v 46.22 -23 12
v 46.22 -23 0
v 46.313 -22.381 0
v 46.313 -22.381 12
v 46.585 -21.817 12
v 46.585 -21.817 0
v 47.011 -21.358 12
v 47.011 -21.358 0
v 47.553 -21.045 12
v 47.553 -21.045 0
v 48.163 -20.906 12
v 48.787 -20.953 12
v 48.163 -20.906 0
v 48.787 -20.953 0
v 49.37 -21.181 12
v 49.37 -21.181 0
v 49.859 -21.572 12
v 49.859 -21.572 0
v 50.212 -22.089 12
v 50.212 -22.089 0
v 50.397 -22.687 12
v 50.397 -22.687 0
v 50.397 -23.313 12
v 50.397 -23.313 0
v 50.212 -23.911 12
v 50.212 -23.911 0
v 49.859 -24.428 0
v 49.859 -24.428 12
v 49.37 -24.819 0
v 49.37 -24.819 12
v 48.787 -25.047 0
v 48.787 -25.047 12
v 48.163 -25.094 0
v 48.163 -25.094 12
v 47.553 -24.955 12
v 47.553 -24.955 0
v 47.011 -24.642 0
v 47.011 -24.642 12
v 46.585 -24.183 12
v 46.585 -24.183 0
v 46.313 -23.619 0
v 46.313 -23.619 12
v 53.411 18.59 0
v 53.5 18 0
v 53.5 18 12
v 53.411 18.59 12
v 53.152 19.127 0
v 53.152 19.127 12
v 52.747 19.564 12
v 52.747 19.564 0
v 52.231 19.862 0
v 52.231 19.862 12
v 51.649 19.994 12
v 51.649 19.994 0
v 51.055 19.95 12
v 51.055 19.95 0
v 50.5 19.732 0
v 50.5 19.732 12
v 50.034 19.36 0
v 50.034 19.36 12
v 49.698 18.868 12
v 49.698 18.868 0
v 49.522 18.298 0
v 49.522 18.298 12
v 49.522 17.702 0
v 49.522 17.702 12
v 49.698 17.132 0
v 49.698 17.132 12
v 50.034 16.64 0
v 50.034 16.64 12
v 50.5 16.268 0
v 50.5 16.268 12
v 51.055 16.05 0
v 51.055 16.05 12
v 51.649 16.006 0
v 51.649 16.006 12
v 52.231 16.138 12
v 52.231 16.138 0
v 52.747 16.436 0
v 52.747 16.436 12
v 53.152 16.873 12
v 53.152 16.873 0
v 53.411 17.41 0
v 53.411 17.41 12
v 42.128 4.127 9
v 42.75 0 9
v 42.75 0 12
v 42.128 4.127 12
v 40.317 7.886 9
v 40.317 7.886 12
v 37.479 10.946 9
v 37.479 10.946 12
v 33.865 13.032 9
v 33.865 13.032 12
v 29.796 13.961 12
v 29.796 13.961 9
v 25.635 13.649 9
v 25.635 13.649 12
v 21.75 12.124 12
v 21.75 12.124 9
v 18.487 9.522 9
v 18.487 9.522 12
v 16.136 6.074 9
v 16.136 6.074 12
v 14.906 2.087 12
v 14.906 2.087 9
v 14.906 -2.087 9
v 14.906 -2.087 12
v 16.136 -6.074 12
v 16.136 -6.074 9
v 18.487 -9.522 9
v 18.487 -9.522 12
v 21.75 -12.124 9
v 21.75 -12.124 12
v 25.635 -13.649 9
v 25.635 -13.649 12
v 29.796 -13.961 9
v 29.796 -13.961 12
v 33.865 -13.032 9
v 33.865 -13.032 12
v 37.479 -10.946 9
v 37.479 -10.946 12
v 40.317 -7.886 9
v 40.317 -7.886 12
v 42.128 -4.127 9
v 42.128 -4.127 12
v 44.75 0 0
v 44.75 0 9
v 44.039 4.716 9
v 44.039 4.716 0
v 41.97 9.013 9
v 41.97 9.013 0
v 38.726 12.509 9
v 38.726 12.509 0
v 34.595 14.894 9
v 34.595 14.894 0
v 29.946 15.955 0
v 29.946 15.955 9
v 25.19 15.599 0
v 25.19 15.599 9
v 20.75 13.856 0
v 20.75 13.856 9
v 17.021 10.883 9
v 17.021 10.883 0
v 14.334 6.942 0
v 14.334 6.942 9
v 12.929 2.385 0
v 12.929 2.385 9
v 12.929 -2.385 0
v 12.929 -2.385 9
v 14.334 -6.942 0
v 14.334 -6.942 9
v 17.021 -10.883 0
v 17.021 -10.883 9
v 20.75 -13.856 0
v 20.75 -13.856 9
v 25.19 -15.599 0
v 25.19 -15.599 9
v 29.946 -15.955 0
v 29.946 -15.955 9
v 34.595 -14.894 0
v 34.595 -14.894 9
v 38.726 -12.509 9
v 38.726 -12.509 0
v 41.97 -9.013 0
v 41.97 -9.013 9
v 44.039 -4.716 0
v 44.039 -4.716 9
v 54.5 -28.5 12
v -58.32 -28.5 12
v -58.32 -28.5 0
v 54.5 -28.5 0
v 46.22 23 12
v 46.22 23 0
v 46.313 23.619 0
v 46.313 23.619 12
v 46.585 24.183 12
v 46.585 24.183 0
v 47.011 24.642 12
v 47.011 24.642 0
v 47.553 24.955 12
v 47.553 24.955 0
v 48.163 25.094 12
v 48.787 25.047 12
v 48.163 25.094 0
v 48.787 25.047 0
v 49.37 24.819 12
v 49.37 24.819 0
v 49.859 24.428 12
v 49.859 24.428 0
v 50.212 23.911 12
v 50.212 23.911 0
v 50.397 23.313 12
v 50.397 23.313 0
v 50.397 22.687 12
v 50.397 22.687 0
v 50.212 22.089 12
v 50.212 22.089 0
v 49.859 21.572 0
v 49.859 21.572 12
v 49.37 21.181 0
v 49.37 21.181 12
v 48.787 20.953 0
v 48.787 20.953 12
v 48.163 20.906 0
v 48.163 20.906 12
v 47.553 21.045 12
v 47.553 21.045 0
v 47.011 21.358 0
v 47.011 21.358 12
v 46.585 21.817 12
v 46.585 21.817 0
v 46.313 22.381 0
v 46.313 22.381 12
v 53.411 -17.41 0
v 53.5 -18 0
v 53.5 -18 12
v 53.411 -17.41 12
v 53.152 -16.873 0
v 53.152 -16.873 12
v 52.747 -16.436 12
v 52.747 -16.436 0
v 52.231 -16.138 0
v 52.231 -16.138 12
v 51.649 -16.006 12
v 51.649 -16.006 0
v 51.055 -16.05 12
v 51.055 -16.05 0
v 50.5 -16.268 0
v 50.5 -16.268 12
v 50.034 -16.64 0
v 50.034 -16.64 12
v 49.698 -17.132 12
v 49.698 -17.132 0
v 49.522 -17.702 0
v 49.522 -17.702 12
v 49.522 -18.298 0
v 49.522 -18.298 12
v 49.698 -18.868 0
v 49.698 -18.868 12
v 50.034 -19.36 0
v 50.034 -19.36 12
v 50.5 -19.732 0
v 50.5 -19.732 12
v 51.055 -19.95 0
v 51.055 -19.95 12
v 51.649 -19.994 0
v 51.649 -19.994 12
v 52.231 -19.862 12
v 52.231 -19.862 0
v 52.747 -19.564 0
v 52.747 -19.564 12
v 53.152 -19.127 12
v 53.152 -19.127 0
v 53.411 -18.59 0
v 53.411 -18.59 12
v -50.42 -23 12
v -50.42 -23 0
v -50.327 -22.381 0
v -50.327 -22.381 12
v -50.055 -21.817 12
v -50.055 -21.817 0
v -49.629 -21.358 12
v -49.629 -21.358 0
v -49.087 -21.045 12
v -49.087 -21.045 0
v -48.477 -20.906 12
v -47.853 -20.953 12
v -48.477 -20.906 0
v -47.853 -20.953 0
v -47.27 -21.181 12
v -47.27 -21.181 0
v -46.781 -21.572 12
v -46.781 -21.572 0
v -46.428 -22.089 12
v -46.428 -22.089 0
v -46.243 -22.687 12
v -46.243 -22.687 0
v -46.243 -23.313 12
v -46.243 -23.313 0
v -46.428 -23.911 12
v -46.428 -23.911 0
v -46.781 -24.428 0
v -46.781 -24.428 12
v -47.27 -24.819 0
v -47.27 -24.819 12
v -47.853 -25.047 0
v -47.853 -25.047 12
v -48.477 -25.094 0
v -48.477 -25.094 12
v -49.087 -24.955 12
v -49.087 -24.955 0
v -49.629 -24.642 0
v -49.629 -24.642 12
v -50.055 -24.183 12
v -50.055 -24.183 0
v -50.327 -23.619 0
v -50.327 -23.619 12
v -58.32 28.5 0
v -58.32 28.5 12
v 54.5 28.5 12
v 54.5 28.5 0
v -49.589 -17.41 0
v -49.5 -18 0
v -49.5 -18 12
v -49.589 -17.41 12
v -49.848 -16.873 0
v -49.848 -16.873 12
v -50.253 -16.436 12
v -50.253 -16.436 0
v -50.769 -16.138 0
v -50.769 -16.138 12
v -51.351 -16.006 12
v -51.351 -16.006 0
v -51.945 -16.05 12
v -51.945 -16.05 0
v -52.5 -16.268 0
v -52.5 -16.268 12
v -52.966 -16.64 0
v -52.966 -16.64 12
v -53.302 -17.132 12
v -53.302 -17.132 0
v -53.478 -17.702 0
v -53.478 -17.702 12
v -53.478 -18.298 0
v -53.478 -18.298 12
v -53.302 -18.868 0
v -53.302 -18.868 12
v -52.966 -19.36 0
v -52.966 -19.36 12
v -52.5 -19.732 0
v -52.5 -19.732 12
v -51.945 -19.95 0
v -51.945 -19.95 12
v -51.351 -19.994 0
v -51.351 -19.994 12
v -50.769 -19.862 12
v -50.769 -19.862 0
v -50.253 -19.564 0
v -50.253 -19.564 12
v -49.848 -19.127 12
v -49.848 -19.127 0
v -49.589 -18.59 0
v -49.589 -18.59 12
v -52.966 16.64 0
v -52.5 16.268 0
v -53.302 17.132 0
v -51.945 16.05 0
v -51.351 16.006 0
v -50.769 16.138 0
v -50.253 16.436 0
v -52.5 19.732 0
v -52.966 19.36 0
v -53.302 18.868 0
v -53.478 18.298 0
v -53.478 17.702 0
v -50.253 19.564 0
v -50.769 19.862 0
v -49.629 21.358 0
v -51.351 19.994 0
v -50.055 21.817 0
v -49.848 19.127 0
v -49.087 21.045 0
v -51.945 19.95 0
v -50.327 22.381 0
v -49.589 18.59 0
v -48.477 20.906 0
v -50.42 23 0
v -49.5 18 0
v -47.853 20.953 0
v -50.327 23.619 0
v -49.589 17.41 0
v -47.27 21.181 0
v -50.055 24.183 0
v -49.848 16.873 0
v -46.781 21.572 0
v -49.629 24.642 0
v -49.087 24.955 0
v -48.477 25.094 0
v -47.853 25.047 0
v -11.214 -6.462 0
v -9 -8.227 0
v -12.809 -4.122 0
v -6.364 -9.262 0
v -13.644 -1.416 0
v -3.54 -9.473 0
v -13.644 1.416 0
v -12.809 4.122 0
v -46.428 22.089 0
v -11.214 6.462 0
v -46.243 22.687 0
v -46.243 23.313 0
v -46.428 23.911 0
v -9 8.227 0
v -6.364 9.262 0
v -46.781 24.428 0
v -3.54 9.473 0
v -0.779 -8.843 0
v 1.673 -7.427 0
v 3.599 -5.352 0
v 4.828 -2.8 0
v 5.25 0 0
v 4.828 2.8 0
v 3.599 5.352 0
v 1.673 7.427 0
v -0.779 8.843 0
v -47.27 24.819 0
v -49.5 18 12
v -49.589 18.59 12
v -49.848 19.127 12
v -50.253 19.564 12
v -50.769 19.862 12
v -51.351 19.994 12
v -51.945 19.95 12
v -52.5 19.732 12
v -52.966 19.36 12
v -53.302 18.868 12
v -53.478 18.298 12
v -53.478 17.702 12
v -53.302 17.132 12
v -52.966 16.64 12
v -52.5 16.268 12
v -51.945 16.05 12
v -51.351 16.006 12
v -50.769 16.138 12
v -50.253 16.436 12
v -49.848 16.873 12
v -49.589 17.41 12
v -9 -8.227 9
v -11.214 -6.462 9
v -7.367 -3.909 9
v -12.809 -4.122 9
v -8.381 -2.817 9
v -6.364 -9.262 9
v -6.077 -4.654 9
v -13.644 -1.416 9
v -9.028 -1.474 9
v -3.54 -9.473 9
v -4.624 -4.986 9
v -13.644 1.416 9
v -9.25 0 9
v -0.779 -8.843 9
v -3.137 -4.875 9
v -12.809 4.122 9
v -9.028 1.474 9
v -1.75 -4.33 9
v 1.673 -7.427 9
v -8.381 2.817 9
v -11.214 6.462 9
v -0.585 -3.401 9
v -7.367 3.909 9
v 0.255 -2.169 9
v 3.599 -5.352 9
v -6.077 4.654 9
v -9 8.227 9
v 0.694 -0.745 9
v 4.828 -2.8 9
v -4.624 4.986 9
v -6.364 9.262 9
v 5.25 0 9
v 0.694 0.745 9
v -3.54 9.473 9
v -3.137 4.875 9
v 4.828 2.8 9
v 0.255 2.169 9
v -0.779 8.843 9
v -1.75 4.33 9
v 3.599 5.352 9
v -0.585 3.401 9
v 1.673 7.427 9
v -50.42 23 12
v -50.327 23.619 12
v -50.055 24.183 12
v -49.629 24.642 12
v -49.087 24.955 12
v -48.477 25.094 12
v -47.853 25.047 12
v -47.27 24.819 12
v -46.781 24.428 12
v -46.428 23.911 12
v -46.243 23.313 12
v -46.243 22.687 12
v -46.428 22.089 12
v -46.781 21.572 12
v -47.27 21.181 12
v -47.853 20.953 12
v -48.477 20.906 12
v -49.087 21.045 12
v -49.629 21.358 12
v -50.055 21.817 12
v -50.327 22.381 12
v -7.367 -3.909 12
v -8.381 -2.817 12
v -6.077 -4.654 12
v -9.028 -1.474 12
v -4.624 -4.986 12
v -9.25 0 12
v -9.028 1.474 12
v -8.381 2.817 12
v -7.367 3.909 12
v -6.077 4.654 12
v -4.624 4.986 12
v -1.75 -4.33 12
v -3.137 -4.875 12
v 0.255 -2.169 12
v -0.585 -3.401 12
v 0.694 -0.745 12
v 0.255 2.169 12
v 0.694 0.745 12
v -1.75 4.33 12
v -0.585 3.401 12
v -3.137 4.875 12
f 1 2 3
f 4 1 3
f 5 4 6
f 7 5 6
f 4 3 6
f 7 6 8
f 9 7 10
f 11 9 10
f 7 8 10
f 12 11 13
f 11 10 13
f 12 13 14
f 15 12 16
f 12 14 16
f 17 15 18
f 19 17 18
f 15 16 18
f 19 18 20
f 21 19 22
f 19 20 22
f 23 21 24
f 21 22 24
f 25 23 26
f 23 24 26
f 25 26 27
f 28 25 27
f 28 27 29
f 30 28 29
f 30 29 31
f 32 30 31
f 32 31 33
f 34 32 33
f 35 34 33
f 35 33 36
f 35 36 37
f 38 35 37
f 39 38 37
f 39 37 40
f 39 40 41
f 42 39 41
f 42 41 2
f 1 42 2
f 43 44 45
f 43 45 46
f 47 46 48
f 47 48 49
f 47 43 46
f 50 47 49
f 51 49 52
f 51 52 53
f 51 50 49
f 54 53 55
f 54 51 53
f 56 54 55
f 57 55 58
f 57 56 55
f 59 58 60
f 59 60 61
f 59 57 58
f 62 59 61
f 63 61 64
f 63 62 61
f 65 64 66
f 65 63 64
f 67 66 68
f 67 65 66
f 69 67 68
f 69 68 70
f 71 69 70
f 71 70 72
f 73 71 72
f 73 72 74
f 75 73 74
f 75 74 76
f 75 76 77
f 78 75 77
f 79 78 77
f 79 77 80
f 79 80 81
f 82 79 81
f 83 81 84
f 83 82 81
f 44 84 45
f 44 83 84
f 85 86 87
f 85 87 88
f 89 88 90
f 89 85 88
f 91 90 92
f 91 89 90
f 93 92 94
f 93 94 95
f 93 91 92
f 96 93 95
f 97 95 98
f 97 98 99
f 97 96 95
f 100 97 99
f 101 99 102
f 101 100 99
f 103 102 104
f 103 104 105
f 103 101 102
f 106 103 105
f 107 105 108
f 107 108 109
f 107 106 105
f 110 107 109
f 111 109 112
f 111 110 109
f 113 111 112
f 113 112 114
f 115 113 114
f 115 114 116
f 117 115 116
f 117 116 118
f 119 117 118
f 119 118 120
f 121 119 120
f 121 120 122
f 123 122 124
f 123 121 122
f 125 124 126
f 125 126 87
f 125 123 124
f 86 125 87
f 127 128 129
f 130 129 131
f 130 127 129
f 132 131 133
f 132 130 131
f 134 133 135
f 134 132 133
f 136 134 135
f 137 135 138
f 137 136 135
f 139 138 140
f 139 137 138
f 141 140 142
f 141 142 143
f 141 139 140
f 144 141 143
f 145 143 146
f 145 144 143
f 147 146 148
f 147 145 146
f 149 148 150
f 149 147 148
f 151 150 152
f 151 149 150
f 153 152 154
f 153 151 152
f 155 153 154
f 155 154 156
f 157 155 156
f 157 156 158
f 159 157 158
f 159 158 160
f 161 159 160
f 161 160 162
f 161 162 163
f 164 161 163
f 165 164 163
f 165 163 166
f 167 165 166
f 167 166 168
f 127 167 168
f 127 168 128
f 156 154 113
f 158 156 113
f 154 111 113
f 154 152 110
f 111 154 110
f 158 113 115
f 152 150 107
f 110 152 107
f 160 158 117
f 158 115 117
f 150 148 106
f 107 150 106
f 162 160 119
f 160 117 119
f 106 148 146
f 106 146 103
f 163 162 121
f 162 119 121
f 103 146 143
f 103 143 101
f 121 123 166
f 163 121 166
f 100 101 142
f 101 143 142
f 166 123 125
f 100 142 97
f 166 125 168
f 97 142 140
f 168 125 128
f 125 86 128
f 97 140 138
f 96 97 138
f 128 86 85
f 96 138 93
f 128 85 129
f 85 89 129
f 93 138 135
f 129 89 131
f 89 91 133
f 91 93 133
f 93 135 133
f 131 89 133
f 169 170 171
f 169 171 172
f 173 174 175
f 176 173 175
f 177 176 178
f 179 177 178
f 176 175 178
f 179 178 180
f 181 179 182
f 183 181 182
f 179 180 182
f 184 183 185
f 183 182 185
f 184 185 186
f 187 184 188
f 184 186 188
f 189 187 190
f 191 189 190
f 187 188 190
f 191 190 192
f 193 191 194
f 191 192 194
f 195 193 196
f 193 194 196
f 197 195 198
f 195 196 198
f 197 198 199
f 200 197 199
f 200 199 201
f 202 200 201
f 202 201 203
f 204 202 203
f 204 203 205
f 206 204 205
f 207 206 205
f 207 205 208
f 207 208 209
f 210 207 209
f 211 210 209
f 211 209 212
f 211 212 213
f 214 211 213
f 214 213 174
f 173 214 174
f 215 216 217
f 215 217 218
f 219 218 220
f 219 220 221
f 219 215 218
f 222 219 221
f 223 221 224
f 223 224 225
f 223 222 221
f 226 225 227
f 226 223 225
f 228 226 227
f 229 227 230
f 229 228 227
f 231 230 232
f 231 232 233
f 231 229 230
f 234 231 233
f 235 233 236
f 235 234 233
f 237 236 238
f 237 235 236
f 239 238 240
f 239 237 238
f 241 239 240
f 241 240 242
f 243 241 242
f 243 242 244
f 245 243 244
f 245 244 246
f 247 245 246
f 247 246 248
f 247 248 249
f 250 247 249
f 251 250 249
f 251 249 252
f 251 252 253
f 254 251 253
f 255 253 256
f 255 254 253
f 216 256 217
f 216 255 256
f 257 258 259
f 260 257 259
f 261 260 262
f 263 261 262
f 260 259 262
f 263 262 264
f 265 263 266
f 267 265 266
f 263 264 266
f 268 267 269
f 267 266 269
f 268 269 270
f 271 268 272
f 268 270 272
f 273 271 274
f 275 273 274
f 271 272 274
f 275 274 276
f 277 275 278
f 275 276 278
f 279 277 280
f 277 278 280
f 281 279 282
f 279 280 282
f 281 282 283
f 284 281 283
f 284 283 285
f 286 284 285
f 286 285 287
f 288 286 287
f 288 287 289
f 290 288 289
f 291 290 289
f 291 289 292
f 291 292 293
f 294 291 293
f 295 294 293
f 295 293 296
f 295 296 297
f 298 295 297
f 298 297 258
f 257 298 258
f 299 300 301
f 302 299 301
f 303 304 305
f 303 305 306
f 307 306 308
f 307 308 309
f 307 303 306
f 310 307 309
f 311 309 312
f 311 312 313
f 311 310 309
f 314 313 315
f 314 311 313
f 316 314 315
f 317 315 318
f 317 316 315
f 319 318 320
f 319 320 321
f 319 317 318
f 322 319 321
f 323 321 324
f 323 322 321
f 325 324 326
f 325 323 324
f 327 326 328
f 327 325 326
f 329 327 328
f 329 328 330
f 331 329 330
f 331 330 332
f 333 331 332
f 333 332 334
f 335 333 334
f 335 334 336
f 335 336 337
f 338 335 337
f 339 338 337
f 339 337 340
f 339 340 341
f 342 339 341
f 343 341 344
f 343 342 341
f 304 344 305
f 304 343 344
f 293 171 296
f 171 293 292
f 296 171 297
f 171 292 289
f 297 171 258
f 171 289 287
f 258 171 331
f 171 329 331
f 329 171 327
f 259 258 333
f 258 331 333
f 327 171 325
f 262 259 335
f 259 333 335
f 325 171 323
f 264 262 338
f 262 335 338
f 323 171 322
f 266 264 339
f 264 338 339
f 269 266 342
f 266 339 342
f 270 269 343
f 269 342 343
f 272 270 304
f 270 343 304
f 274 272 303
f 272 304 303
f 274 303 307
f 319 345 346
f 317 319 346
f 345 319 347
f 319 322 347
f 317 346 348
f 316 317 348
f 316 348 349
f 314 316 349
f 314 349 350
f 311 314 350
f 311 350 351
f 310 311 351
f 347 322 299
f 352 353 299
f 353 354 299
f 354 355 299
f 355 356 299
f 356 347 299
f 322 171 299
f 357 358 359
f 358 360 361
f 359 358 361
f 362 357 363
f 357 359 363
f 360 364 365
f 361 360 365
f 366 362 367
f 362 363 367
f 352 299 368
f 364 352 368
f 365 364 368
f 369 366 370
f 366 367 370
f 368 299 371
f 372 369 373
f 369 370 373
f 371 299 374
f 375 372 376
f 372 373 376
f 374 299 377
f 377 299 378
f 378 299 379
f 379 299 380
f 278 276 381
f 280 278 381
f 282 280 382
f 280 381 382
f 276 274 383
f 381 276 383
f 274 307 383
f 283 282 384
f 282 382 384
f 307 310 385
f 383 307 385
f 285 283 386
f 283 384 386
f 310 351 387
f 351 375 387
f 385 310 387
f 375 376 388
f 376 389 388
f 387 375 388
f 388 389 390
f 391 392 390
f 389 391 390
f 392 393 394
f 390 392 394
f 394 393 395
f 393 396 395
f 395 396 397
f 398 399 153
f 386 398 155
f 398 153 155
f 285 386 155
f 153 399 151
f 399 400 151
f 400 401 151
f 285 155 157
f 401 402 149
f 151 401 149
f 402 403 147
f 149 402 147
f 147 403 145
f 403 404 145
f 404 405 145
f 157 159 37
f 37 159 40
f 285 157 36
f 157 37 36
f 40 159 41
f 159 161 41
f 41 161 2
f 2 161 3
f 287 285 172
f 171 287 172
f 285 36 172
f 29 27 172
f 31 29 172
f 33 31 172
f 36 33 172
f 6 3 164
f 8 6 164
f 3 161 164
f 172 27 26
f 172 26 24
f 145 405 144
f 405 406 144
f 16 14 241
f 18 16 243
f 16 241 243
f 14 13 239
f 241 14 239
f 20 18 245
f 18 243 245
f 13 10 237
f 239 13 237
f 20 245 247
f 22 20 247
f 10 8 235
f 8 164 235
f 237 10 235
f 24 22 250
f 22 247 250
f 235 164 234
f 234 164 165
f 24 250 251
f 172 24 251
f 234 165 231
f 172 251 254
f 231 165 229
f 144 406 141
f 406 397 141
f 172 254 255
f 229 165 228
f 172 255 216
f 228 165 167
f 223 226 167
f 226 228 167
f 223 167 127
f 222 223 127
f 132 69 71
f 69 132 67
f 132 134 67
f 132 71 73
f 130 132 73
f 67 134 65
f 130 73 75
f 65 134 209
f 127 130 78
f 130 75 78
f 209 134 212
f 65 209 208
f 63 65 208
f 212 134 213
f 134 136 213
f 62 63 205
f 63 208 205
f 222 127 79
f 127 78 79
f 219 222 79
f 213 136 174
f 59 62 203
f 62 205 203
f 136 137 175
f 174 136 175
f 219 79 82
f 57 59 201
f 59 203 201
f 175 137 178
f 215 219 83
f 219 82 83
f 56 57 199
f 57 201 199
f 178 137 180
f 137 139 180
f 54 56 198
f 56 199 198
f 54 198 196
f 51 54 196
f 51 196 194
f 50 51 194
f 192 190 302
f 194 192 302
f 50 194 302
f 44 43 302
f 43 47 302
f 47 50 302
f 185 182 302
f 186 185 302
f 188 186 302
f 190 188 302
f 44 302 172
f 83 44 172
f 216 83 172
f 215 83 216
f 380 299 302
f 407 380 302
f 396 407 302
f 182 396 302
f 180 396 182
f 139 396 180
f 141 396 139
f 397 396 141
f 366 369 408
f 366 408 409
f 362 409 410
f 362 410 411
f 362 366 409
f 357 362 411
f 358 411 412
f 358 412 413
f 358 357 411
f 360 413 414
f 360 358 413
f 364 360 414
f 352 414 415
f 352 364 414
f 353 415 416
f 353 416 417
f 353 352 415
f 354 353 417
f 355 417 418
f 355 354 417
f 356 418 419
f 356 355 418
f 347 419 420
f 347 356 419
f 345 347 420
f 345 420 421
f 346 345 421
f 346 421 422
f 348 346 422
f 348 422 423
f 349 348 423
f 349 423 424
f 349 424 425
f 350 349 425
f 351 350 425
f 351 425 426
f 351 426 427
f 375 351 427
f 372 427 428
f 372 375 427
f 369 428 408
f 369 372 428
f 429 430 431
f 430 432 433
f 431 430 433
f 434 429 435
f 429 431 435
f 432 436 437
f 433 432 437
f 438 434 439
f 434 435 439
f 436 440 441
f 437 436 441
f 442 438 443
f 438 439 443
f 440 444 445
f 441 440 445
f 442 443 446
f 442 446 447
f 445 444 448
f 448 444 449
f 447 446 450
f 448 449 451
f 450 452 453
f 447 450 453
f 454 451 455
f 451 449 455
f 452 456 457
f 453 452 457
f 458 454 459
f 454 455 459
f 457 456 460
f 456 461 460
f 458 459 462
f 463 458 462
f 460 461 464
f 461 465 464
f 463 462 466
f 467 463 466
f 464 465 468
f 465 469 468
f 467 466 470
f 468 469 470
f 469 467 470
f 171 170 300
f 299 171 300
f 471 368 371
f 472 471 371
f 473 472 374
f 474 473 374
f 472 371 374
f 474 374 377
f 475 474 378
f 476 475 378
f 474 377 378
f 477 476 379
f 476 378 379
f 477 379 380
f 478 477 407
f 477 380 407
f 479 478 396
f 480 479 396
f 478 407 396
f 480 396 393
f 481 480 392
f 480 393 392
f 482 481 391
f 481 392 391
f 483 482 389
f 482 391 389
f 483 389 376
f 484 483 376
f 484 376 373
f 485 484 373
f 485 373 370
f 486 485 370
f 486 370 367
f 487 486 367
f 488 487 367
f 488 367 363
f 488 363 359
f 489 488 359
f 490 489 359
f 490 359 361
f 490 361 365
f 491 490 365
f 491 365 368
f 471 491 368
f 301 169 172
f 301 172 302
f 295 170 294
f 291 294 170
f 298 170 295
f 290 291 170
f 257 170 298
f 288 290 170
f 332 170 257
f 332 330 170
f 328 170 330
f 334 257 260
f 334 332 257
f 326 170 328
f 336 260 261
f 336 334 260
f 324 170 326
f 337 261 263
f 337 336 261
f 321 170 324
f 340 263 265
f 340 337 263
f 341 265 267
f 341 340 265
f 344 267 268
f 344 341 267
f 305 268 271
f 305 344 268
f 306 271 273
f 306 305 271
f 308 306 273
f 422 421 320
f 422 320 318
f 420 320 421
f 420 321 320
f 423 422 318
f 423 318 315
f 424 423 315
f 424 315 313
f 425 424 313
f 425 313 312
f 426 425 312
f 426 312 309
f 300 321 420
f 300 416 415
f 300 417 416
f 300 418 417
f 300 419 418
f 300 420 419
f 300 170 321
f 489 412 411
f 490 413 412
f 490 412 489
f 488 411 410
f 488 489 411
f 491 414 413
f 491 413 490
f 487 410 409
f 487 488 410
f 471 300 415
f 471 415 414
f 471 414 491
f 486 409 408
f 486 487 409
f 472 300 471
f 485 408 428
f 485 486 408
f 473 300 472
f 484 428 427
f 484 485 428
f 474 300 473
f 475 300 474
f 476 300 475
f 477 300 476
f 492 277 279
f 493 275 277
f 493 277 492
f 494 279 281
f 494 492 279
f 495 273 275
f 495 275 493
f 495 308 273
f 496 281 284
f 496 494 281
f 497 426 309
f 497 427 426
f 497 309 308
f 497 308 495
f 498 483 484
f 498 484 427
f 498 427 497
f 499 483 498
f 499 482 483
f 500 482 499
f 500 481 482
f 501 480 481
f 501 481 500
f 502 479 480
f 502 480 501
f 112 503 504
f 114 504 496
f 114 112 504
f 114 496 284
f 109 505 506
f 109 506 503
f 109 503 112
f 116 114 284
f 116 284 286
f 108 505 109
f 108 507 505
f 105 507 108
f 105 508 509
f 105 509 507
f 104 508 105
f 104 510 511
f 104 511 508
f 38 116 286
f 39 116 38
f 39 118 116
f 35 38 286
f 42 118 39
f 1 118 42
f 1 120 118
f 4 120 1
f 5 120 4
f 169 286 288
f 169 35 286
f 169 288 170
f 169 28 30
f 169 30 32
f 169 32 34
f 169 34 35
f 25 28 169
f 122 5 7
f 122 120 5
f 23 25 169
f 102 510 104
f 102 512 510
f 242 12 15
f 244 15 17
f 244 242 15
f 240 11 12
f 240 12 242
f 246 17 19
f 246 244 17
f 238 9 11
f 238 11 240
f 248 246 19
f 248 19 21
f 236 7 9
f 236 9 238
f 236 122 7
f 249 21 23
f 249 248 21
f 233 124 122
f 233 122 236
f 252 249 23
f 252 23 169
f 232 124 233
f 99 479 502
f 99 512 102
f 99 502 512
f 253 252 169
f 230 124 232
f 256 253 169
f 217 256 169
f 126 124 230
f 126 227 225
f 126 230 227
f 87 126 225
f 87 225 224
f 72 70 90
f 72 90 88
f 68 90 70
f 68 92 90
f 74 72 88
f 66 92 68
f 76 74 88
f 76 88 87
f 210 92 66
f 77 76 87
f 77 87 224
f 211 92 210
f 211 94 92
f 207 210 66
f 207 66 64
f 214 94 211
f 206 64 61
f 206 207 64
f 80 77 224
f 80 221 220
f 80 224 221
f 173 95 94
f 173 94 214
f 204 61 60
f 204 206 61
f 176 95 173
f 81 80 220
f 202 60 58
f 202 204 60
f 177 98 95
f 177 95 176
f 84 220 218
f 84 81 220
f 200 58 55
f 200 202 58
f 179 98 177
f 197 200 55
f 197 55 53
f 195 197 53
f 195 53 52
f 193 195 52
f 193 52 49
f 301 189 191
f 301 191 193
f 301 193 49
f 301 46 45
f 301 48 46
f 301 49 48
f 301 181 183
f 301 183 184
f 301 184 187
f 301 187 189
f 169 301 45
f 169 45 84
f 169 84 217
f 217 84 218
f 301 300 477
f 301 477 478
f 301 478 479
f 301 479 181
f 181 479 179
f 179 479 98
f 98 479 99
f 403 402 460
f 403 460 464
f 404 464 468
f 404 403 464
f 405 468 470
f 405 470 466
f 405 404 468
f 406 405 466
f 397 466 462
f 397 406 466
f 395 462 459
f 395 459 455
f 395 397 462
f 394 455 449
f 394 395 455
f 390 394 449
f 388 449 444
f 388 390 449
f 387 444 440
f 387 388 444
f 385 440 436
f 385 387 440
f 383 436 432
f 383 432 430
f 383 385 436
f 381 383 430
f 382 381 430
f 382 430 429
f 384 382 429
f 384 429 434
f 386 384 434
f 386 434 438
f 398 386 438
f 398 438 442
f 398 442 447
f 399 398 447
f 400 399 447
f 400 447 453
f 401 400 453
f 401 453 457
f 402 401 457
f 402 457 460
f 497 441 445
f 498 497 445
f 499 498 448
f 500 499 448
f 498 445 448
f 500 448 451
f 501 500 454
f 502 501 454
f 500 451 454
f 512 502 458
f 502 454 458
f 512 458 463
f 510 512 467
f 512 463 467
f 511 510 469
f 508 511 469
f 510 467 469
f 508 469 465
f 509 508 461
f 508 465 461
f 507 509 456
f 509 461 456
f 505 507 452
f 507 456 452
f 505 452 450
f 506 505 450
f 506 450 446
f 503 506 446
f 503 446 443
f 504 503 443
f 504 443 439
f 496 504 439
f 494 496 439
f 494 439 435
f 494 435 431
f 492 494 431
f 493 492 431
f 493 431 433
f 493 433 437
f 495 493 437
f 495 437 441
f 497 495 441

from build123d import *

# Parameters (mm, degrees)
ESBO_O1_W                = 118
ESBO_O1_H                = 62
ESBO_O1_R                = 9.5
ESBO_O1_R_2              = 16
ESBO_O1_R_3              = 2
RESSALTO_EXTRUS_O1_DEPTH = 12
FURO_COM_FOLGA_DE_M51_D  = 4.2
RESSALTO_EXTRUS_O4_START = -3
ESBO_O17_R               = 9.5
RESSALTO_EXTRUS_O4_DEPTH = 3
ESBO_O18_W               = 118
ESBO_O18_H               = 62
ESBO_O18_W_2             = 112.82
ESBO_O18_H_2             = 57
CORTE_EXTRUS_O3_DEPTH    = 68.720011813
RESSALTO_EXTRUS_O5_START = -3
ESBO_O19_R               = 16
ESBO_O19_R_2             = 14
RESSALTO_EXTRUS_O5_DEPTH = 3
ESBO_O21_R               = 5
CORTE_EXTRUS_O4_DEPTH    = 10


with BuildPart() as part:
    # Esboço1 → Ressalto-extrusão1 (new body)
    with BuildSketch(Plane.XY):
        Rectangle(ESBO_O1_W, ESBO_O1_H)
        with Locations((-4.25, 0)):
            Circle(ESBO_O1_R, mode=Mode.SUBTRACT)
        with Locations((28.75, 0)):
            Circle(ESBO_O1_R_2, mode=Mode.SUBTRACT)
        with Locations((51.5, -18)):
            Circle(ESBO_O1_R_3, mode=Mode.SUBTRACT)
        with Locations((51.5, 18)):
            Circle(ESBO_O1_R_3, mode=Mode.SUBTRACT)
        with Locations((-51.5, -18)):
            Circle(ESBO_O1_R_3, mode=Mode.SUBTRACT)
        with Locations((-51.5, 18)):
            Circle(ESBO_O1_R_3, mode=Mode.SUBTRACT)
    extrude(amount=RESSALTO_EXTRUS_O1_DEPTH)

    # Furo com folga de M51 (through all)
    with Locations(Plane.XY.offset(12)):
        with Locations((-48.32, 23), (-48.32, -23), (48.32, -23), (48.32, 23)):
            Hole(FURO_COM_FOLGA_DE_M51_D / 2)

    # Esboço17 → Ressalto-extrusão4 (add)
    with BuildSketch(Plane.XY.offset(12).offset(RESSALTO_EXTRUS_O4_START)):
        with Locations((-4.25, 0)):
            Circle(ESBO_O17_R)
    extrude(amount=RESSALTO_EXTRUS_O4_DEPTH)

    # Esboço18 → Corte-extrusão3 (cut, through all)
    with BuildSketch(Plane.XY.offset(12)):
        Rectangle(ESBO_O18_W, ESBO_O18_H)
        with Locations((-1.91, 0)):
            Rectangle(ESBO_O18_W_2, ESBO_O18_H_2, mode=Mode.SUBTRACT)
    extrude(amount=-CORTE_EXTRUS_O3_DEPTH, mode=Mode.SUBTRACT)

    # Esboço19 → Ressalto-extrusão5 (add)
    with BuildSketch(Plane.XY.offset(12).offset(RESSALTO_EXTRUS_O5_START)):
        with Locations((28.75, 0)):
            Circle(ESBO_O19_R)
        with Locations((28.75, 0)):
            Circle(ESBO_O19_R_2, mode=Mode.SUBTRACT)
    extrude(amount=RESSALTO_EXTRUS_O5_DEPTH)

    # Esboço21 → Corte-extrusão4 (cut)
    with BuildSketch(Plane(origin=(0, 0, 9), x_dir=(-1, 0, 0), z_dir=(0, 0, -1))):
        with Locations((4.25, 0)):
            Circle(ESBO_O21_R)
    extrude(amount=-CORTE_EXTRUS_O4_DEPTH, mode=Mode.SUBTRACT)


solid = part.part
